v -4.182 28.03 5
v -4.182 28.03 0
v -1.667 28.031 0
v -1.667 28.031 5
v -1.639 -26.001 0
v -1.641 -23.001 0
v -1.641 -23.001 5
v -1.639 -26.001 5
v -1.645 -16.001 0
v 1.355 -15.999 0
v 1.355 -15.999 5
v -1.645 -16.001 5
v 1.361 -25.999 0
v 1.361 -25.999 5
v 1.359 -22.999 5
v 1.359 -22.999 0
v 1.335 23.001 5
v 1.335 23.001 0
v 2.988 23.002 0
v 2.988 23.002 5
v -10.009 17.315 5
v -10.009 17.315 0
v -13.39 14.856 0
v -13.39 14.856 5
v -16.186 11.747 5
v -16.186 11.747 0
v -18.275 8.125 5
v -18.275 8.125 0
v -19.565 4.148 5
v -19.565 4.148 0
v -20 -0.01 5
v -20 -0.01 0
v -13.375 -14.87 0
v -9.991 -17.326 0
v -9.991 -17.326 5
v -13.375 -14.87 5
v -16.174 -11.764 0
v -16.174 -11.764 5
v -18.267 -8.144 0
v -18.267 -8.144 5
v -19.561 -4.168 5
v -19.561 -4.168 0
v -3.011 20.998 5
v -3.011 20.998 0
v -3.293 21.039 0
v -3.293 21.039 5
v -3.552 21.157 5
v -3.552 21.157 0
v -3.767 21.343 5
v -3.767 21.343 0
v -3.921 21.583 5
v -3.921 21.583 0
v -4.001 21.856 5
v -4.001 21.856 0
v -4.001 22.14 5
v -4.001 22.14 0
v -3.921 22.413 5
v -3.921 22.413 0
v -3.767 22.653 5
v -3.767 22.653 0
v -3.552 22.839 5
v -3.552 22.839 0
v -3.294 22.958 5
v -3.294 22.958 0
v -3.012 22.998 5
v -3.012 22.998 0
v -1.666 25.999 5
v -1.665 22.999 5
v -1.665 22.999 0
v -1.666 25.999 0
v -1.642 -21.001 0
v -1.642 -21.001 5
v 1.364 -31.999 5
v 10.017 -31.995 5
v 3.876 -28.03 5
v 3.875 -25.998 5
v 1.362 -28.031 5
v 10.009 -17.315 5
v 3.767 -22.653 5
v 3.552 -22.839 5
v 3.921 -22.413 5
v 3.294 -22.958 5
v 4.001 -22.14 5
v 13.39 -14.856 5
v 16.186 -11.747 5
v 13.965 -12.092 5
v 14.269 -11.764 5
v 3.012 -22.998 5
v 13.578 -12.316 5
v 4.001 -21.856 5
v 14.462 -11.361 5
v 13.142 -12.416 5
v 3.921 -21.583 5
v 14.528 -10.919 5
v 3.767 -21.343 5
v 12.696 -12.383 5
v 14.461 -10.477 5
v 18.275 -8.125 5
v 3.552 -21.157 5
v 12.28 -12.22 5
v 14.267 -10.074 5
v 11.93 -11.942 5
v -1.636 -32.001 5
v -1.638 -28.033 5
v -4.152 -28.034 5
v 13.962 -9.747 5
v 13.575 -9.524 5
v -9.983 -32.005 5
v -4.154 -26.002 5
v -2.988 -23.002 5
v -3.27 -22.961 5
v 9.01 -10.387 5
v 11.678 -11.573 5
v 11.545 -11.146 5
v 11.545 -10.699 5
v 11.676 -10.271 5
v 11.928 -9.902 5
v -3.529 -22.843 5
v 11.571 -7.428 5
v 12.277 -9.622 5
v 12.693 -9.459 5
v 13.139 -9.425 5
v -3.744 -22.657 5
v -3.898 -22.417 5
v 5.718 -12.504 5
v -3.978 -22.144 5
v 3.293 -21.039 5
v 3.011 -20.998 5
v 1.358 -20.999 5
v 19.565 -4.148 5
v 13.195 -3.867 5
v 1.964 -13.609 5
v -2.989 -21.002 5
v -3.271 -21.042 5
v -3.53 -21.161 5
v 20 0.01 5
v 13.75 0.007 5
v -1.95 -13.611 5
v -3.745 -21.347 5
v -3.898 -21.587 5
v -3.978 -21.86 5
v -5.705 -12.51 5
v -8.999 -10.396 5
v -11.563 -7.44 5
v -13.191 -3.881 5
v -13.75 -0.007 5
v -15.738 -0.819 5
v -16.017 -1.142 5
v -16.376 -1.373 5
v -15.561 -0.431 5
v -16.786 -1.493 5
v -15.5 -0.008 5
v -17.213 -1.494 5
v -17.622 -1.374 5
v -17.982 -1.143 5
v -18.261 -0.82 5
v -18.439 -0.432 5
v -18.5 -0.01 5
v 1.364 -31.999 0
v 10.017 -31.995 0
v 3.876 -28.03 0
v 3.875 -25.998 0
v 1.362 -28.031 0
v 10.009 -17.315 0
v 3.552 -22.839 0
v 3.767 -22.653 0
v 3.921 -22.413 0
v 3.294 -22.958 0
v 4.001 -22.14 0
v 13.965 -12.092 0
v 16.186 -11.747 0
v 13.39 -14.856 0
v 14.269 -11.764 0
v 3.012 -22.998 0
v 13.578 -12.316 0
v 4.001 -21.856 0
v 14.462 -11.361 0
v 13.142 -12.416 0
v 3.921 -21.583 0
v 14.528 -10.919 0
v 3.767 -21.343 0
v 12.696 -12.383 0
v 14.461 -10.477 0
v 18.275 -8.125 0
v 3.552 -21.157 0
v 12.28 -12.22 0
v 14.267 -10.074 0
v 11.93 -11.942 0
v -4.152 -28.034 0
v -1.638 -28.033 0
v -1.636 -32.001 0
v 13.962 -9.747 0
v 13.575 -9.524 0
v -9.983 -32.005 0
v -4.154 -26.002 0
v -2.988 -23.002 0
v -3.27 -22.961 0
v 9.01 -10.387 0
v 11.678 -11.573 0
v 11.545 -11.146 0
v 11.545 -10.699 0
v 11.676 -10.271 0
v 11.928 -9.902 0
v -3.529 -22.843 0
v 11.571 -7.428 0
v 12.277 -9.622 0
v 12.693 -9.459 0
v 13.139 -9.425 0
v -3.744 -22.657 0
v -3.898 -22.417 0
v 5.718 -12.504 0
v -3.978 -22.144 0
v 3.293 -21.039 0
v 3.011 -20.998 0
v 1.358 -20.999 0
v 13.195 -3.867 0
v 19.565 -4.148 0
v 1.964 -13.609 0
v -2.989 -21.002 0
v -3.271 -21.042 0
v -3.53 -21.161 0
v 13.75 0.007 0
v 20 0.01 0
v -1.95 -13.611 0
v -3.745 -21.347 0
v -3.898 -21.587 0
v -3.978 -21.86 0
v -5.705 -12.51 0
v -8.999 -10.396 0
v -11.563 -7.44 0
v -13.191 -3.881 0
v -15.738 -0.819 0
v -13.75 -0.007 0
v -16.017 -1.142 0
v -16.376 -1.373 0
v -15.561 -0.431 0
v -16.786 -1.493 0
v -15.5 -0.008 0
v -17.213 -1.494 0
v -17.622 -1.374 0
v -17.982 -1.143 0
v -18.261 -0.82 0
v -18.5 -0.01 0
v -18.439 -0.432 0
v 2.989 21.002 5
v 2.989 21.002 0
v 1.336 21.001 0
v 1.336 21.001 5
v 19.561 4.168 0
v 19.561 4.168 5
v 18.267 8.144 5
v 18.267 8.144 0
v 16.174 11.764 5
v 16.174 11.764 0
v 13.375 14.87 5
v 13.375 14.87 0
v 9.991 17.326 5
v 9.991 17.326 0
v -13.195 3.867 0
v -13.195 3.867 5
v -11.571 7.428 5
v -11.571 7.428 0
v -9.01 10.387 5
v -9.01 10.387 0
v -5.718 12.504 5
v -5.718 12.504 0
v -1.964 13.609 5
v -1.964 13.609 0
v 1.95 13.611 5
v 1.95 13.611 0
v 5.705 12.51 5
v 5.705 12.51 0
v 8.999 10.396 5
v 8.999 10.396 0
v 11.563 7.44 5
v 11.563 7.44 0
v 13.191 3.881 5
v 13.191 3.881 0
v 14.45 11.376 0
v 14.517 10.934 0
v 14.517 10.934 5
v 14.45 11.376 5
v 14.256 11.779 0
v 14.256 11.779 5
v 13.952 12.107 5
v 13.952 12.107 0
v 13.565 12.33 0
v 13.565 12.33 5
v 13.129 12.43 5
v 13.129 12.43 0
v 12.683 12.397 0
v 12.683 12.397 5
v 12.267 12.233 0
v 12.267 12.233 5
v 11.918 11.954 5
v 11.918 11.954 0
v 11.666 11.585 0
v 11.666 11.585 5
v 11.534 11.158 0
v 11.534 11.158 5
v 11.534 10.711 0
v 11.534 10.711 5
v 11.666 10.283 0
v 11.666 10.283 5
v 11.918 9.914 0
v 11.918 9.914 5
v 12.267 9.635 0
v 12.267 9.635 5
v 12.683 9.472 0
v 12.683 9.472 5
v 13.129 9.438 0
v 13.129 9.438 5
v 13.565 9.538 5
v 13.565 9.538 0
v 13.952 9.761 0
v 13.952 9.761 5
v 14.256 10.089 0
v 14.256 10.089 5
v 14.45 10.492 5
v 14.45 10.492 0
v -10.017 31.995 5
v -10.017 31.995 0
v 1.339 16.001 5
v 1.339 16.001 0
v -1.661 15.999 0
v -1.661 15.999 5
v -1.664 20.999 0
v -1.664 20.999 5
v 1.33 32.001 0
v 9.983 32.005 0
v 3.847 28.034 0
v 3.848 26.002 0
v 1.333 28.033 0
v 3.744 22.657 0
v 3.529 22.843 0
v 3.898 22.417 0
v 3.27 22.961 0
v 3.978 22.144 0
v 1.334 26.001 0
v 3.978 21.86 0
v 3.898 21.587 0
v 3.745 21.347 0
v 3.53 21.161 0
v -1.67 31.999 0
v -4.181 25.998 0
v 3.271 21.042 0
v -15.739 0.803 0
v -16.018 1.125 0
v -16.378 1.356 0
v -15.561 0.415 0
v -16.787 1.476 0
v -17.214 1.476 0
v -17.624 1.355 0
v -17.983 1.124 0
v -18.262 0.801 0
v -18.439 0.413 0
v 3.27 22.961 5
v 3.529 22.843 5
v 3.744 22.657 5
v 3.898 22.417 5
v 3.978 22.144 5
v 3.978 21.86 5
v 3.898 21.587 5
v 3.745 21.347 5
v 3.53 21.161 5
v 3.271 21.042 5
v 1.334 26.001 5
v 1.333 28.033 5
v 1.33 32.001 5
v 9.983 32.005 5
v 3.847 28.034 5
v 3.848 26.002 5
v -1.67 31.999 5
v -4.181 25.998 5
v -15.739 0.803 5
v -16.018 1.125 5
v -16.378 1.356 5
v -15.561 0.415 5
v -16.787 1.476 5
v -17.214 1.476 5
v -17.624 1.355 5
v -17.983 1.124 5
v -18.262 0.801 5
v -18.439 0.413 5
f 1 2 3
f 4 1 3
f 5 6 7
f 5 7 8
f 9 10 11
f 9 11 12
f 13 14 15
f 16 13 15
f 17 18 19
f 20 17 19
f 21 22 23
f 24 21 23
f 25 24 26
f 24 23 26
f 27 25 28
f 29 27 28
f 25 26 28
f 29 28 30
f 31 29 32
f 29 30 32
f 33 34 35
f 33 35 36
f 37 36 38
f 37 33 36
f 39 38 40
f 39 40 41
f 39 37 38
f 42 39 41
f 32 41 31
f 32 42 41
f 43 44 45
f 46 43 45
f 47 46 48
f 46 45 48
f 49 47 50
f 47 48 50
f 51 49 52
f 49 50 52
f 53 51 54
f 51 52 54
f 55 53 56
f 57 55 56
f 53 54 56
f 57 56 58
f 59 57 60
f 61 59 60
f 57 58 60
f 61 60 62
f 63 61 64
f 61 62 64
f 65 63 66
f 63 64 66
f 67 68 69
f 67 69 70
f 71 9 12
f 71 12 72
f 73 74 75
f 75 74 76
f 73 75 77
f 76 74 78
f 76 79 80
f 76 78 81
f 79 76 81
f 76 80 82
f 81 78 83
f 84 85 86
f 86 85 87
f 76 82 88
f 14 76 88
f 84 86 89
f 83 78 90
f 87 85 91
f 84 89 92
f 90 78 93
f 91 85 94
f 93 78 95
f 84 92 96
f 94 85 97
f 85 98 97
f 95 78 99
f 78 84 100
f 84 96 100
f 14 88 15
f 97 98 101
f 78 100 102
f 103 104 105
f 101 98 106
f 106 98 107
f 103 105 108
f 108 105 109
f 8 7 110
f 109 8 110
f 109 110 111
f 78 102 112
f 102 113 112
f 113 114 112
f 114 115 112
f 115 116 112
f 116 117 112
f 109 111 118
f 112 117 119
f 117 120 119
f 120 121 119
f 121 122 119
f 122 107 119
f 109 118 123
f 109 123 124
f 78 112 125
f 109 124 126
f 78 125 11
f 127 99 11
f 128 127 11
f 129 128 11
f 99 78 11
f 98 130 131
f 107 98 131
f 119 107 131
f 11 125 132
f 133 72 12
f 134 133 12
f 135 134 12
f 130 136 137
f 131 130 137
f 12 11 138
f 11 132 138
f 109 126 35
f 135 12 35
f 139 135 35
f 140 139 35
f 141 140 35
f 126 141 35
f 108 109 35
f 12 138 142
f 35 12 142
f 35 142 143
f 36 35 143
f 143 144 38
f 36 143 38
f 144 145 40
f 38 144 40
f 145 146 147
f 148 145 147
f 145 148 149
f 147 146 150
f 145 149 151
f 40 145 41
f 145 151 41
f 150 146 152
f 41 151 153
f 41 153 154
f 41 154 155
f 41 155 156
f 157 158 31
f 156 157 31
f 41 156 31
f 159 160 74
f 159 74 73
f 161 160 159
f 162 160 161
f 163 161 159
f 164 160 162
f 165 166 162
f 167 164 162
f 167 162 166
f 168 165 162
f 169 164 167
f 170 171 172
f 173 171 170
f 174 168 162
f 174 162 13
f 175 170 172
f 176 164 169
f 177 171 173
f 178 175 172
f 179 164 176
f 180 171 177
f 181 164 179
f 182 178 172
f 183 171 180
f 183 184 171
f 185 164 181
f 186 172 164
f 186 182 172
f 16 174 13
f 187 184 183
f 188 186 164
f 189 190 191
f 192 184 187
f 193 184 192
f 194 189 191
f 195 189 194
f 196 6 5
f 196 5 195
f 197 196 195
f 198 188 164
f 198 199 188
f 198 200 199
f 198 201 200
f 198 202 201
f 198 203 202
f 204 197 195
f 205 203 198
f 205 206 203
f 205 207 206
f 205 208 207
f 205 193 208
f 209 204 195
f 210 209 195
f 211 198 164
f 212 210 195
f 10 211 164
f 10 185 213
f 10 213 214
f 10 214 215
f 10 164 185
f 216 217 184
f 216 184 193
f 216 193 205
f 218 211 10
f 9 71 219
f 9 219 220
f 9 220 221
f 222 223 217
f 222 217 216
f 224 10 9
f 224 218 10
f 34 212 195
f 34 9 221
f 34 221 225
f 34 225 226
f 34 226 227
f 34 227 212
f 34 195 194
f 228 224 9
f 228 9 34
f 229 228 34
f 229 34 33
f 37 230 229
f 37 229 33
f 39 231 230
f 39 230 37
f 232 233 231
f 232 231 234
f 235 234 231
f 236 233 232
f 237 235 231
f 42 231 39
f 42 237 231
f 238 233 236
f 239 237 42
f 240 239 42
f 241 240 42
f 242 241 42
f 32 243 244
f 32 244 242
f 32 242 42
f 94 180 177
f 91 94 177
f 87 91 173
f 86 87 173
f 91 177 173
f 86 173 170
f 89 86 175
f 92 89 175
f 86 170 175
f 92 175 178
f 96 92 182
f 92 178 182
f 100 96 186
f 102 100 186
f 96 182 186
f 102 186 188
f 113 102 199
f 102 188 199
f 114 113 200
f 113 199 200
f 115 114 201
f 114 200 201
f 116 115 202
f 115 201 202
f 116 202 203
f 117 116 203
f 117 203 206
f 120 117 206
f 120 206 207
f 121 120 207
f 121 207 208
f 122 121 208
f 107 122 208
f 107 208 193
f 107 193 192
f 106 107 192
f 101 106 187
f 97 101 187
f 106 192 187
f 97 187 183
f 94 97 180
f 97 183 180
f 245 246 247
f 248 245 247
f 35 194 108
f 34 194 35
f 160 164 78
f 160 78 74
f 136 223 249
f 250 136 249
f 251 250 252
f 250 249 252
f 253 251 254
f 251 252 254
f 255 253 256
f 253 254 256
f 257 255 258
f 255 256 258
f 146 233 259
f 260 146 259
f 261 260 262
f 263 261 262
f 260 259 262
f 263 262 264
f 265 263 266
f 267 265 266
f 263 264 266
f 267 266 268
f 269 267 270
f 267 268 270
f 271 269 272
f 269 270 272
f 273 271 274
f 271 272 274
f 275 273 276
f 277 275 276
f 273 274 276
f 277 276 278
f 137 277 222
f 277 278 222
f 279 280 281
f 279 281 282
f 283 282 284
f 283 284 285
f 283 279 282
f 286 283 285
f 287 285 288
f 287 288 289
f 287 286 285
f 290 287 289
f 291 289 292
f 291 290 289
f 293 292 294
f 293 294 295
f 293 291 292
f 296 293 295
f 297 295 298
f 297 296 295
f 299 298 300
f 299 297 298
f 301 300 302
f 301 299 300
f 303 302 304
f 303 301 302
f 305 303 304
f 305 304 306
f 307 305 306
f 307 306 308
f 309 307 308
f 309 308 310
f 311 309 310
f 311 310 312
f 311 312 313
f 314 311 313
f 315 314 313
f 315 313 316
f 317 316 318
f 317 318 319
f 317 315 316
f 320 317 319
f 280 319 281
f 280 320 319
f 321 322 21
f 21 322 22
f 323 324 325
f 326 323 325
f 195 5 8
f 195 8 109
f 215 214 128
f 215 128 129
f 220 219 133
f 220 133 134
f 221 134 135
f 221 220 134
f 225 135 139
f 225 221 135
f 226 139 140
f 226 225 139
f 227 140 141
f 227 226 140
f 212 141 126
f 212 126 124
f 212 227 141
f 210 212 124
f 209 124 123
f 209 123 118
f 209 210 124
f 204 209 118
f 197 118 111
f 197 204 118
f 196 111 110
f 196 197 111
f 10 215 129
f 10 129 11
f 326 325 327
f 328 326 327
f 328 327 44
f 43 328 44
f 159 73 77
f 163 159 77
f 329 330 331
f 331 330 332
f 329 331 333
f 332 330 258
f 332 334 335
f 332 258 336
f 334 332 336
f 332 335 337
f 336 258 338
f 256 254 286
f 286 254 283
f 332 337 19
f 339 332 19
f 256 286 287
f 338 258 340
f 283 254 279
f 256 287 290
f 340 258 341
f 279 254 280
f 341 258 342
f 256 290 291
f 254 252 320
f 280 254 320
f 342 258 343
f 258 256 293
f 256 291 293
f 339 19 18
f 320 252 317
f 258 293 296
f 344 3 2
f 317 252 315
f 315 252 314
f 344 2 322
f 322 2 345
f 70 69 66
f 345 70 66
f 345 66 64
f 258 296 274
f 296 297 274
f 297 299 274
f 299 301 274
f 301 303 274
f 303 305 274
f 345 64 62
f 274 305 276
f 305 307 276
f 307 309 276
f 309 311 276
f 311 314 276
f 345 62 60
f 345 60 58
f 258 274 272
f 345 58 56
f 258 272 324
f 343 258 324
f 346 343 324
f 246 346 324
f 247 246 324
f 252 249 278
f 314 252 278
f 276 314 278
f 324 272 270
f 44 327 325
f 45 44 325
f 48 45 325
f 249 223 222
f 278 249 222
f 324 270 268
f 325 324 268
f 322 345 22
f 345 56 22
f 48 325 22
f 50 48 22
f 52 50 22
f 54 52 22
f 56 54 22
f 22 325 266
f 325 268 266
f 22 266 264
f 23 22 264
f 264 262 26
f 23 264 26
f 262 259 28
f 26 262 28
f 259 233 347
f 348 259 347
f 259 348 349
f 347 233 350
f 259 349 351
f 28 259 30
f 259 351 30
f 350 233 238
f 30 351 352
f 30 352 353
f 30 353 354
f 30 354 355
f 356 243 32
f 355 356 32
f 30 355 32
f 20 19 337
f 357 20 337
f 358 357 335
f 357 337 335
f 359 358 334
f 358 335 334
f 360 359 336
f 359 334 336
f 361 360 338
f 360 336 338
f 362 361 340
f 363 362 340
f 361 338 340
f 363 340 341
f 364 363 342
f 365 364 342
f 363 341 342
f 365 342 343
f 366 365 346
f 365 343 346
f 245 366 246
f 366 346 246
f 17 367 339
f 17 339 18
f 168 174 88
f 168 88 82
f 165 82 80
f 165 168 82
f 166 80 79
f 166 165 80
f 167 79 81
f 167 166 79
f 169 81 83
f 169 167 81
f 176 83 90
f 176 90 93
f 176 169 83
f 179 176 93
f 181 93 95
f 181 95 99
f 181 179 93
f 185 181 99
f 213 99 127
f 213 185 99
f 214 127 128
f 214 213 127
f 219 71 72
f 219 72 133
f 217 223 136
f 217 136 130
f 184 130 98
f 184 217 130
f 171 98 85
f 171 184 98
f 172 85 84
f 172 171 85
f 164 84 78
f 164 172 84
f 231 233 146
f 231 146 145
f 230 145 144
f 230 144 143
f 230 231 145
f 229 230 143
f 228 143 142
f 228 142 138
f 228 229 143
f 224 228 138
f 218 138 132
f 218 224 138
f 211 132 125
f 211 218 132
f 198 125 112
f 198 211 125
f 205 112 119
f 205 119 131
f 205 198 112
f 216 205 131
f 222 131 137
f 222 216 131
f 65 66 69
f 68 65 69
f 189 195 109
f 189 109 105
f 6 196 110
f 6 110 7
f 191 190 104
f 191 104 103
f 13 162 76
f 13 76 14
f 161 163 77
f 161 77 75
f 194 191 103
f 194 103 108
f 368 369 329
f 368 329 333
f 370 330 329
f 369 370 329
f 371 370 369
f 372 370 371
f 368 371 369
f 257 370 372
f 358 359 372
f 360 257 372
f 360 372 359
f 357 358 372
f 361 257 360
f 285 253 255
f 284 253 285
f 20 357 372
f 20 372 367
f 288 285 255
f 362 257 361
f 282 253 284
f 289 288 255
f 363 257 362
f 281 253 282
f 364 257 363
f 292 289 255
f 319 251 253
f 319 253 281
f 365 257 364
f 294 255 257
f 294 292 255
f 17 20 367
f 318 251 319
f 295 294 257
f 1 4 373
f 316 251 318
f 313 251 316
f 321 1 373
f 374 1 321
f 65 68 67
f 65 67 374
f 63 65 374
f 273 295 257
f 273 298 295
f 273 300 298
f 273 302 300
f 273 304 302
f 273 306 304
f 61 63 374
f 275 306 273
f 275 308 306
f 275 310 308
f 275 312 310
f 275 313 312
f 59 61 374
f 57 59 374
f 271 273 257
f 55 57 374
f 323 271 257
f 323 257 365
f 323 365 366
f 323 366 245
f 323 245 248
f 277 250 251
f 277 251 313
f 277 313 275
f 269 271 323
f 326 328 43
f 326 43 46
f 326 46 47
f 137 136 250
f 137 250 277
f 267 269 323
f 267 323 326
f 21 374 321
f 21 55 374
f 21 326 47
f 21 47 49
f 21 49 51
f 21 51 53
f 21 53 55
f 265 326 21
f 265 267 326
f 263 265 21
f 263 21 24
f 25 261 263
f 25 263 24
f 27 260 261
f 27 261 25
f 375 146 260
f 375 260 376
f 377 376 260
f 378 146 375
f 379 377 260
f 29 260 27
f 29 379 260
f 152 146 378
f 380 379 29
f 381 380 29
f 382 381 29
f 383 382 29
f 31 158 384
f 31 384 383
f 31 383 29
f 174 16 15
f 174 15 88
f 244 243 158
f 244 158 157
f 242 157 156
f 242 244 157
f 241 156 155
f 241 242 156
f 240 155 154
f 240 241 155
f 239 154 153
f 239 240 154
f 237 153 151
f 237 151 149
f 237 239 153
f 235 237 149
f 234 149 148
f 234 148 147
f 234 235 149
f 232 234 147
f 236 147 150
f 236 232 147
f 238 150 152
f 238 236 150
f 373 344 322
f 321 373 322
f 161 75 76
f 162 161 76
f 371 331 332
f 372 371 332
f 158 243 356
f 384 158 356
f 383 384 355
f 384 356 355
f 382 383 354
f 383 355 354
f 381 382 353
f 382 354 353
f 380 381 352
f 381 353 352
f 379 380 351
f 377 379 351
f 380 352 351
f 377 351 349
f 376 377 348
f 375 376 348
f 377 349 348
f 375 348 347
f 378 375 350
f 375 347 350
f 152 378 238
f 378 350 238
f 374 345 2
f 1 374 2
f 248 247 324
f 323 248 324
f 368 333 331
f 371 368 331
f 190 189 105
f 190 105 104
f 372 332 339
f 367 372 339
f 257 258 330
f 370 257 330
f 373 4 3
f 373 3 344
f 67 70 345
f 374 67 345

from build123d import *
from build123d.topology import SkipClean

# Parameters (mm, degrees)
SKETCH1_R           = 1.5
BOSS_EXTRUDE1_DEPTH = 5


with BuildPart() as part:
    # Sketch1 → Boss-Extrude1 (new body)
    with BuildSketch(Plane(origin=(0, 0, 0), x_dir=(-0.9999998655639977, -0.000518528674721734, 0), z_dir=(0, 0, 1))):
        with BuildLine():
            Line((20, 0), (18.5, 0))
            ThreePointArc((18.5, 0), (17, -1.5), (15.5, 0))
            Line((15.5, 0), (13.75, 0))
            ThreePointArc((13.75, 0), (0, -13.75), (-13.75, 0))
            Line((-13.75, 0), (-20, 0))
            ThreePointArc((-20, 0), (-17.320508076, -10), (-10, -17.320508076))
            Line((-10, -17.320508076), (-10, -32))
            Line((-10, -32), (-1.347069158, -32))
            Line((-1.347069158, -32), (-1.347069158, -28.031929013))
            Line((-1.347069158, -28.031929013), (-3.861161574, -28.031929013))
            Line((-3.861161574, -28.031929013), (-3.861161574, -26))
            Line((-3.861161574, -26), (-1.347069158, -26))
            Line((-1.347069158, -26), (-1.347069158, -23))
            Line((-1.347069158, -23), (-3, -23))
            ThreePointArc((-3, -23), (-4, -22), (-3, -21))
            Line((-3, -21), (-1.347069158, -21))
            Line((-1.347069158, -21), (-1.347069158, -16))
            Line((-1.347069158, -16), (1.652930842, -16))
            Line((1.652930842, -16), (1.652930842, -21))
            Line((1.652930842, -21), (3, -21))
            ThreePointArc((3, -21), (4, -22), (3, -23))
            Line((3, -23), (1.652930842, -23))
            Line((1.652930842, -23), (1.652930842, -26))
            Line((1.652930842, -26), (4.167023259, -26))
            Line((4.167023259, -26), (4.167023259, -28.031929013))
            Line((4.167023259, -28.031929013), (1.652930842, -28.031929013))
            Line((1.652930842, -28.031929013), (1.652930842, -32))
            Line((1.652930842, -32), (10, -32))
            Line((10, -32), (10, -17.320508076))
            ThreePointArc((10, -17.320508076), (17.320508076, -10), (20, 0))
        make_face()
        with Locations(Location((-13.022755533, -10.927389365, 0), (0, 0, 179.970290494))):
            Circle(SKETCH1_R, mode=Mode.SUBTRACT)
    boss_extrude1 = extrude(amount=BOSS_EXTRUDE1_DEPTH)

    # Mirror1: Boss-Extrude1 across plane
    with SkipClean():  # the faces are left unmerged after this step: merging them gives an invalid solid
        add(boss_extrude1.mirror(Plane(origin=(-1.06692597, -0.000553232, 5), x_dir=(0, 0, 1), z_dir=(-0.0005185286747217338, 0.9999998655639978, 0))))


solid = part.part
